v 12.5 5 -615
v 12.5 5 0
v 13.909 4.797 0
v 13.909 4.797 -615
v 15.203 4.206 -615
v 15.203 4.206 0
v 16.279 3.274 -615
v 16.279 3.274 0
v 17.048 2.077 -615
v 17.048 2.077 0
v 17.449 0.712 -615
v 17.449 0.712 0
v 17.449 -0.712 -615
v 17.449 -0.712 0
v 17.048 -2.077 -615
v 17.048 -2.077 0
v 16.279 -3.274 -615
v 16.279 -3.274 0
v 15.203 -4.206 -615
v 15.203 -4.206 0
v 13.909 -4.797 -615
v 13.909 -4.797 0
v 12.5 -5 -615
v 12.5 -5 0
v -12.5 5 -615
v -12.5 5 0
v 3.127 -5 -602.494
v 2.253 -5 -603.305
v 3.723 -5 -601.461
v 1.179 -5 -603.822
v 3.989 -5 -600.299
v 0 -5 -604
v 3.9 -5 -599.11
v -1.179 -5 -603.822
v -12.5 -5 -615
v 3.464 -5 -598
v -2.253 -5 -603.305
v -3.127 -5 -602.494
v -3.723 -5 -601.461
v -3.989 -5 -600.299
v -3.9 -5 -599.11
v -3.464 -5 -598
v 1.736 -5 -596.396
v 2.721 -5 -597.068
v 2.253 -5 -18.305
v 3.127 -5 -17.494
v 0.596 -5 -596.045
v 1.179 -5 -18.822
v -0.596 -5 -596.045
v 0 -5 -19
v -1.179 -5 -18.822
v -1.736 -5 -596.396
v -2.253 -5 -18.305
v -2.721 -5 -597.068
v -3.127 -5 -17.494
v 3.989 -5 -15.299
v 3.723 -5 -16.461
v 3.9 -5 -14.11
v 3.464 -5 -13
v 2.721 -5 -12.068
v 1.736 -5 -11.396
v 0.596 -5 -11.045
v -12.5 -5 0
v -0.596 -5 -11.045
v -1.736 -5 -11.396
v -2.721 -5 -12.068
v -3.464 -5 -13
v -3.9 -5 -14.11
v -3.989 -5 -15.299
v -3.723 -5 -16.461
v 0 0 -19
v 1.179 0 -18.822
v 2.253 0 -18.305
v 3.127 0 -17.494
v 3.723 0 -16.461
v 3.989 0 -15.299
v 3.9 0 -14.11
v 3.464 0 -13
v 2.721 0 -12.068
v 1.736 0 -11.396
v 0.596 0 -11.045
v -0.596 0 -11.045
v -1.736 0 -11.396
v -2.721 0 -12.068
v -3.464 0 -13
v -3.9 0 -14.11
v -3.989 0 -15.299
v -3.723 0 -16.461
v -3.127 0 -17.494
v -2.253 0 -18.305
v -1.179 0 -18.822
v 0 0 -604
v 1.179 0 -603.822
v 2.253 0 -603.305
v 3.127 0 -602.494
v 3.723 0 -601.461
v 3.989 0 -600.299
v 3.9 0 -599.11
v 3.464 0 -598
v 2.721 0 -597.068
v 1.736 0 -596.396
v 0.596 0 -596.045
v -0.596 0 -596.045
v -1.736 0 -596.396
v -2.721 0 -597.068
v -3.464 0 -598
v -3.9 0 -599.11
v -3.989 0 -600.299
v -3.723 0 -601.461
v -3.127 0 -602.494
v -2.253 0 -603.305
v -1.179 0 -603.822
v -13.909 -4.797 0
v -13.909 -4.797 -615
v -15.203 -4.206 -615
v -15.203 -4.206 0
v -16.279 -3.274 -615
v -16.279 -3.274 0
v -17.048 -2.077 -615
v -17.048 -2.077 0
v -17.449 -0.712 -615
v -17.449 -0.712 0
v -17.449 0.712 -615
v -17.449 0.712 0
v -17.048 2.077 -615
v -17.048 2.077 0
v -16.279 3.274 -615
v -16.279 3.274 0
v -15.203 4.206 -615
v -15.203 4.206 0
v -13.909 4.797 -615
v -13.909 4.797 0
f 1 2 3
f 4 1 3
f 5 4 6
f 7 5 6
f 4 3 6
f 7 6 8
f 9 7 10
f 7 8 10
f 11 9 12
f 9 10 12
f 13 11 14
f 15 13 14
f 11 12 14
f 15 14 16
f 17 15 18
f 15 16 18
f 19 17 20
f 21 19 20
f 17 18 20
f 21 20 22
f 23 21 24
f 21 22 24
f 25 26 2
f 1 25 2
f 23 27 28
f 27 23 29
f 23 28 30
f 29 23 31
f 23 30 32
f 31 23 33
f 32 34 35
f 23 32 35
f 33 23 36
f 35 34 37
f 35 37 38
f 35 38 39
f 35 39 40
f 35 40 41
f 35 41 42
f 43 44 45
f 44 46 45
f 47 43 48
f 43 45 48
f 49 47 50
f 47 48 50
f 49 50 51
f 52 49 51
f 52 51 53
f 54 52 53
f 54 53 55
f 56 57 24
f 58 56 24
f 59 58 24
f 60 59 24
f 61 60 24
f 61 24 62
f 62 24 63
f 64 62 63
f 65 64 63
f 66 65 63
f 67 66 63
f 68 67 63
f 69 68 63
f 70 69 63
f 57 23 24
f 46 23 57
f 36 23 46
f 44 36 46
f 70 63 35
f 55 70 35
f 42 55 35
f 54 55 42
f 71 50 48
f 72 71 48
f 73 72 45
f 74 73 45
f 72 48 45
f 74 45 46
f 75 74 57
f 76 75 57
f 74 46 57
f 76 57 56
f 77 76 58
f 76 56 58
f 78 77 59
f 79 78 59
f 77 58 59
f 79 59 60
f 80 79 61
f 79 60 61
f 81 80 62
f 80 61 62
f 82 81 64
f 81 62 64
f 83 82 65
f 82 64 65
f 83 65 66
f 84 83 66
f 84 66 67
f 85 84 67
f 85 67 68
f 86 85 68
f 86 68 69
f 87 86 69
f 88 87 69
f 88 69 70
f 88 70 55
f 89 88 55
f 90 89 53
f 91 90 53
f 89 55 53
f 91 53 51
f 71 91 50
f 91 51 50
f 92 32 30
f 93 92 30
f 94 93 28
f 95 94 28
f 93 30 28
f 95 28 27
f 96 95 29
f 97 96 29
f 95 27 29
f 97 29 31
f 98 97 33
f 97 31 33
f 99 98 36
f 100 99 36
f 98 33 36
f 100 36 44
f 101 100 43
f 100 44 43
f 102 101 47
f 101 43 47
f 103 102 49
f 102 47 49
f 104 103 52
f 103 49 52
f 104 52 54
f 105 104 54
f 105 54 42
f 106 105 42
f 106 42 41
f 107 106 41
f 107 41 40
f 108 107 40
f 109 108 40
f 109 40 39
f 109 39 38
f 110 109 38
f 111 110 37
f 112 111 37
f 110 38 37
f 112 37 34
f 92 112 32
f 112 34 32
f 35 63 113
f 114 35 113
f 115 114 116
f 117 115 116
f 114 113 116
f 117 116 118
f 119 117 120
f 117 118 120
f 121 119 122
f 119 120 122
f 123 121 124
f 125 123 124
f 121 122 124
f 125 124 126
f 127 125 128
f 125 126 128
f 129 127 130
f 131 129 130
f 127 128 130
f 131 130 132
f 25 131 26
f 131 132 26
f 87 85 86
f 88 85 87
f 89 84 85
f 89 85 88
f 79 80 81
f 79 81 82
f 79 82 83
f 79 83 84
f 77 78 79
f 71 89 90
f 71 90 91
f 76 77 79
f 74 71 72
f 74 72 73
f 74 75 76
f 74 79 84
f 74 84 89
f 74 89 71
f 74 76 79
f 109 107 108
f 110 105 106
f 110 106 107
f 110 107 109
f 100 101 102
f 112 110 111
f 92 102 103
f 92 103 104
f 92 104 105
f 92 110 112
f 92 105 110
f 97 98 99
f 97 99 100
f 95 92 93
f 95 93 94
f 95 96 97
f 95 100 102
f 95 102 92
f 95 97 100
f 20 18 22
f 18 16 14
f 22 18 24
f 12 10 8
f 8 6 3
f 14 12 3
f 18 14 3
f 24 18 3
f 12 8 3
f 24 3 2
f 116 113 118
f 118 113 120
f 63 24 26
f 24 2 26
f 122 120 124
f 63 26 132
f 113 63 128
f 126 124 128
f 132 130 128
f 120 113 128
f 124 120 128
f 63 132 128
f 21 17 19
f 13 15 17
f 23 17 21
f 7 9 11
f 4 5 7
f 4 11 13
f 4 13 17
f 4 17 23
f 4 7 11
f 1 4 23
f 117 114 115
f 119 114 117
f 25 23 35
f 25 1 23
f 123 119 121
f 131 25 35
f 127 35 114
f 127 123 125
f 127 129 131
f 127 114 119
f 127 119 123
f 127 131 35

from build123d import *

# Parameters (mm, degrees)
BOSS_EXTRUDE1_DEPTH = 615
SKETCH2_R           = 4
CUT_EXTRUDE1_DEPTH  = 5


with BuildPart() as part:
    # Sketch1 → Boss-Extrude1 (new body)
    with BuildSketch(Plane.XY):
        with BuildLine():
            Line((-12.5, 5), (12.5, 5))
            ThreePointArc((12.5, 5), (17.5, 0), (12.5, -5))
            Line((12.5, -5), (-12.5, -5))
            ThreePointArc((-12.5, -5), (-17.5, 0), (-12.5, 5))
        make_face()
    extrude(amount=-BOSS_EXTRUDE1_DEPTH)

    # Sketch2 → Cut-Extrude1 (cut)
    with BuildSketch(Plane.XZ.offset(5)):
        with Locations(Location((0, -15, 0), (0, 0, 270))):
            Circle(SKETCH2_R)
        with Locations(Location((0, -600, 0), (0, 0, 270))):
            Circle(SKETCH2_R)
    extrude(amount=-CUT_EXTRUDE1_DEPTH, mode=Mode.SUBTRACT)


solid = part.part
